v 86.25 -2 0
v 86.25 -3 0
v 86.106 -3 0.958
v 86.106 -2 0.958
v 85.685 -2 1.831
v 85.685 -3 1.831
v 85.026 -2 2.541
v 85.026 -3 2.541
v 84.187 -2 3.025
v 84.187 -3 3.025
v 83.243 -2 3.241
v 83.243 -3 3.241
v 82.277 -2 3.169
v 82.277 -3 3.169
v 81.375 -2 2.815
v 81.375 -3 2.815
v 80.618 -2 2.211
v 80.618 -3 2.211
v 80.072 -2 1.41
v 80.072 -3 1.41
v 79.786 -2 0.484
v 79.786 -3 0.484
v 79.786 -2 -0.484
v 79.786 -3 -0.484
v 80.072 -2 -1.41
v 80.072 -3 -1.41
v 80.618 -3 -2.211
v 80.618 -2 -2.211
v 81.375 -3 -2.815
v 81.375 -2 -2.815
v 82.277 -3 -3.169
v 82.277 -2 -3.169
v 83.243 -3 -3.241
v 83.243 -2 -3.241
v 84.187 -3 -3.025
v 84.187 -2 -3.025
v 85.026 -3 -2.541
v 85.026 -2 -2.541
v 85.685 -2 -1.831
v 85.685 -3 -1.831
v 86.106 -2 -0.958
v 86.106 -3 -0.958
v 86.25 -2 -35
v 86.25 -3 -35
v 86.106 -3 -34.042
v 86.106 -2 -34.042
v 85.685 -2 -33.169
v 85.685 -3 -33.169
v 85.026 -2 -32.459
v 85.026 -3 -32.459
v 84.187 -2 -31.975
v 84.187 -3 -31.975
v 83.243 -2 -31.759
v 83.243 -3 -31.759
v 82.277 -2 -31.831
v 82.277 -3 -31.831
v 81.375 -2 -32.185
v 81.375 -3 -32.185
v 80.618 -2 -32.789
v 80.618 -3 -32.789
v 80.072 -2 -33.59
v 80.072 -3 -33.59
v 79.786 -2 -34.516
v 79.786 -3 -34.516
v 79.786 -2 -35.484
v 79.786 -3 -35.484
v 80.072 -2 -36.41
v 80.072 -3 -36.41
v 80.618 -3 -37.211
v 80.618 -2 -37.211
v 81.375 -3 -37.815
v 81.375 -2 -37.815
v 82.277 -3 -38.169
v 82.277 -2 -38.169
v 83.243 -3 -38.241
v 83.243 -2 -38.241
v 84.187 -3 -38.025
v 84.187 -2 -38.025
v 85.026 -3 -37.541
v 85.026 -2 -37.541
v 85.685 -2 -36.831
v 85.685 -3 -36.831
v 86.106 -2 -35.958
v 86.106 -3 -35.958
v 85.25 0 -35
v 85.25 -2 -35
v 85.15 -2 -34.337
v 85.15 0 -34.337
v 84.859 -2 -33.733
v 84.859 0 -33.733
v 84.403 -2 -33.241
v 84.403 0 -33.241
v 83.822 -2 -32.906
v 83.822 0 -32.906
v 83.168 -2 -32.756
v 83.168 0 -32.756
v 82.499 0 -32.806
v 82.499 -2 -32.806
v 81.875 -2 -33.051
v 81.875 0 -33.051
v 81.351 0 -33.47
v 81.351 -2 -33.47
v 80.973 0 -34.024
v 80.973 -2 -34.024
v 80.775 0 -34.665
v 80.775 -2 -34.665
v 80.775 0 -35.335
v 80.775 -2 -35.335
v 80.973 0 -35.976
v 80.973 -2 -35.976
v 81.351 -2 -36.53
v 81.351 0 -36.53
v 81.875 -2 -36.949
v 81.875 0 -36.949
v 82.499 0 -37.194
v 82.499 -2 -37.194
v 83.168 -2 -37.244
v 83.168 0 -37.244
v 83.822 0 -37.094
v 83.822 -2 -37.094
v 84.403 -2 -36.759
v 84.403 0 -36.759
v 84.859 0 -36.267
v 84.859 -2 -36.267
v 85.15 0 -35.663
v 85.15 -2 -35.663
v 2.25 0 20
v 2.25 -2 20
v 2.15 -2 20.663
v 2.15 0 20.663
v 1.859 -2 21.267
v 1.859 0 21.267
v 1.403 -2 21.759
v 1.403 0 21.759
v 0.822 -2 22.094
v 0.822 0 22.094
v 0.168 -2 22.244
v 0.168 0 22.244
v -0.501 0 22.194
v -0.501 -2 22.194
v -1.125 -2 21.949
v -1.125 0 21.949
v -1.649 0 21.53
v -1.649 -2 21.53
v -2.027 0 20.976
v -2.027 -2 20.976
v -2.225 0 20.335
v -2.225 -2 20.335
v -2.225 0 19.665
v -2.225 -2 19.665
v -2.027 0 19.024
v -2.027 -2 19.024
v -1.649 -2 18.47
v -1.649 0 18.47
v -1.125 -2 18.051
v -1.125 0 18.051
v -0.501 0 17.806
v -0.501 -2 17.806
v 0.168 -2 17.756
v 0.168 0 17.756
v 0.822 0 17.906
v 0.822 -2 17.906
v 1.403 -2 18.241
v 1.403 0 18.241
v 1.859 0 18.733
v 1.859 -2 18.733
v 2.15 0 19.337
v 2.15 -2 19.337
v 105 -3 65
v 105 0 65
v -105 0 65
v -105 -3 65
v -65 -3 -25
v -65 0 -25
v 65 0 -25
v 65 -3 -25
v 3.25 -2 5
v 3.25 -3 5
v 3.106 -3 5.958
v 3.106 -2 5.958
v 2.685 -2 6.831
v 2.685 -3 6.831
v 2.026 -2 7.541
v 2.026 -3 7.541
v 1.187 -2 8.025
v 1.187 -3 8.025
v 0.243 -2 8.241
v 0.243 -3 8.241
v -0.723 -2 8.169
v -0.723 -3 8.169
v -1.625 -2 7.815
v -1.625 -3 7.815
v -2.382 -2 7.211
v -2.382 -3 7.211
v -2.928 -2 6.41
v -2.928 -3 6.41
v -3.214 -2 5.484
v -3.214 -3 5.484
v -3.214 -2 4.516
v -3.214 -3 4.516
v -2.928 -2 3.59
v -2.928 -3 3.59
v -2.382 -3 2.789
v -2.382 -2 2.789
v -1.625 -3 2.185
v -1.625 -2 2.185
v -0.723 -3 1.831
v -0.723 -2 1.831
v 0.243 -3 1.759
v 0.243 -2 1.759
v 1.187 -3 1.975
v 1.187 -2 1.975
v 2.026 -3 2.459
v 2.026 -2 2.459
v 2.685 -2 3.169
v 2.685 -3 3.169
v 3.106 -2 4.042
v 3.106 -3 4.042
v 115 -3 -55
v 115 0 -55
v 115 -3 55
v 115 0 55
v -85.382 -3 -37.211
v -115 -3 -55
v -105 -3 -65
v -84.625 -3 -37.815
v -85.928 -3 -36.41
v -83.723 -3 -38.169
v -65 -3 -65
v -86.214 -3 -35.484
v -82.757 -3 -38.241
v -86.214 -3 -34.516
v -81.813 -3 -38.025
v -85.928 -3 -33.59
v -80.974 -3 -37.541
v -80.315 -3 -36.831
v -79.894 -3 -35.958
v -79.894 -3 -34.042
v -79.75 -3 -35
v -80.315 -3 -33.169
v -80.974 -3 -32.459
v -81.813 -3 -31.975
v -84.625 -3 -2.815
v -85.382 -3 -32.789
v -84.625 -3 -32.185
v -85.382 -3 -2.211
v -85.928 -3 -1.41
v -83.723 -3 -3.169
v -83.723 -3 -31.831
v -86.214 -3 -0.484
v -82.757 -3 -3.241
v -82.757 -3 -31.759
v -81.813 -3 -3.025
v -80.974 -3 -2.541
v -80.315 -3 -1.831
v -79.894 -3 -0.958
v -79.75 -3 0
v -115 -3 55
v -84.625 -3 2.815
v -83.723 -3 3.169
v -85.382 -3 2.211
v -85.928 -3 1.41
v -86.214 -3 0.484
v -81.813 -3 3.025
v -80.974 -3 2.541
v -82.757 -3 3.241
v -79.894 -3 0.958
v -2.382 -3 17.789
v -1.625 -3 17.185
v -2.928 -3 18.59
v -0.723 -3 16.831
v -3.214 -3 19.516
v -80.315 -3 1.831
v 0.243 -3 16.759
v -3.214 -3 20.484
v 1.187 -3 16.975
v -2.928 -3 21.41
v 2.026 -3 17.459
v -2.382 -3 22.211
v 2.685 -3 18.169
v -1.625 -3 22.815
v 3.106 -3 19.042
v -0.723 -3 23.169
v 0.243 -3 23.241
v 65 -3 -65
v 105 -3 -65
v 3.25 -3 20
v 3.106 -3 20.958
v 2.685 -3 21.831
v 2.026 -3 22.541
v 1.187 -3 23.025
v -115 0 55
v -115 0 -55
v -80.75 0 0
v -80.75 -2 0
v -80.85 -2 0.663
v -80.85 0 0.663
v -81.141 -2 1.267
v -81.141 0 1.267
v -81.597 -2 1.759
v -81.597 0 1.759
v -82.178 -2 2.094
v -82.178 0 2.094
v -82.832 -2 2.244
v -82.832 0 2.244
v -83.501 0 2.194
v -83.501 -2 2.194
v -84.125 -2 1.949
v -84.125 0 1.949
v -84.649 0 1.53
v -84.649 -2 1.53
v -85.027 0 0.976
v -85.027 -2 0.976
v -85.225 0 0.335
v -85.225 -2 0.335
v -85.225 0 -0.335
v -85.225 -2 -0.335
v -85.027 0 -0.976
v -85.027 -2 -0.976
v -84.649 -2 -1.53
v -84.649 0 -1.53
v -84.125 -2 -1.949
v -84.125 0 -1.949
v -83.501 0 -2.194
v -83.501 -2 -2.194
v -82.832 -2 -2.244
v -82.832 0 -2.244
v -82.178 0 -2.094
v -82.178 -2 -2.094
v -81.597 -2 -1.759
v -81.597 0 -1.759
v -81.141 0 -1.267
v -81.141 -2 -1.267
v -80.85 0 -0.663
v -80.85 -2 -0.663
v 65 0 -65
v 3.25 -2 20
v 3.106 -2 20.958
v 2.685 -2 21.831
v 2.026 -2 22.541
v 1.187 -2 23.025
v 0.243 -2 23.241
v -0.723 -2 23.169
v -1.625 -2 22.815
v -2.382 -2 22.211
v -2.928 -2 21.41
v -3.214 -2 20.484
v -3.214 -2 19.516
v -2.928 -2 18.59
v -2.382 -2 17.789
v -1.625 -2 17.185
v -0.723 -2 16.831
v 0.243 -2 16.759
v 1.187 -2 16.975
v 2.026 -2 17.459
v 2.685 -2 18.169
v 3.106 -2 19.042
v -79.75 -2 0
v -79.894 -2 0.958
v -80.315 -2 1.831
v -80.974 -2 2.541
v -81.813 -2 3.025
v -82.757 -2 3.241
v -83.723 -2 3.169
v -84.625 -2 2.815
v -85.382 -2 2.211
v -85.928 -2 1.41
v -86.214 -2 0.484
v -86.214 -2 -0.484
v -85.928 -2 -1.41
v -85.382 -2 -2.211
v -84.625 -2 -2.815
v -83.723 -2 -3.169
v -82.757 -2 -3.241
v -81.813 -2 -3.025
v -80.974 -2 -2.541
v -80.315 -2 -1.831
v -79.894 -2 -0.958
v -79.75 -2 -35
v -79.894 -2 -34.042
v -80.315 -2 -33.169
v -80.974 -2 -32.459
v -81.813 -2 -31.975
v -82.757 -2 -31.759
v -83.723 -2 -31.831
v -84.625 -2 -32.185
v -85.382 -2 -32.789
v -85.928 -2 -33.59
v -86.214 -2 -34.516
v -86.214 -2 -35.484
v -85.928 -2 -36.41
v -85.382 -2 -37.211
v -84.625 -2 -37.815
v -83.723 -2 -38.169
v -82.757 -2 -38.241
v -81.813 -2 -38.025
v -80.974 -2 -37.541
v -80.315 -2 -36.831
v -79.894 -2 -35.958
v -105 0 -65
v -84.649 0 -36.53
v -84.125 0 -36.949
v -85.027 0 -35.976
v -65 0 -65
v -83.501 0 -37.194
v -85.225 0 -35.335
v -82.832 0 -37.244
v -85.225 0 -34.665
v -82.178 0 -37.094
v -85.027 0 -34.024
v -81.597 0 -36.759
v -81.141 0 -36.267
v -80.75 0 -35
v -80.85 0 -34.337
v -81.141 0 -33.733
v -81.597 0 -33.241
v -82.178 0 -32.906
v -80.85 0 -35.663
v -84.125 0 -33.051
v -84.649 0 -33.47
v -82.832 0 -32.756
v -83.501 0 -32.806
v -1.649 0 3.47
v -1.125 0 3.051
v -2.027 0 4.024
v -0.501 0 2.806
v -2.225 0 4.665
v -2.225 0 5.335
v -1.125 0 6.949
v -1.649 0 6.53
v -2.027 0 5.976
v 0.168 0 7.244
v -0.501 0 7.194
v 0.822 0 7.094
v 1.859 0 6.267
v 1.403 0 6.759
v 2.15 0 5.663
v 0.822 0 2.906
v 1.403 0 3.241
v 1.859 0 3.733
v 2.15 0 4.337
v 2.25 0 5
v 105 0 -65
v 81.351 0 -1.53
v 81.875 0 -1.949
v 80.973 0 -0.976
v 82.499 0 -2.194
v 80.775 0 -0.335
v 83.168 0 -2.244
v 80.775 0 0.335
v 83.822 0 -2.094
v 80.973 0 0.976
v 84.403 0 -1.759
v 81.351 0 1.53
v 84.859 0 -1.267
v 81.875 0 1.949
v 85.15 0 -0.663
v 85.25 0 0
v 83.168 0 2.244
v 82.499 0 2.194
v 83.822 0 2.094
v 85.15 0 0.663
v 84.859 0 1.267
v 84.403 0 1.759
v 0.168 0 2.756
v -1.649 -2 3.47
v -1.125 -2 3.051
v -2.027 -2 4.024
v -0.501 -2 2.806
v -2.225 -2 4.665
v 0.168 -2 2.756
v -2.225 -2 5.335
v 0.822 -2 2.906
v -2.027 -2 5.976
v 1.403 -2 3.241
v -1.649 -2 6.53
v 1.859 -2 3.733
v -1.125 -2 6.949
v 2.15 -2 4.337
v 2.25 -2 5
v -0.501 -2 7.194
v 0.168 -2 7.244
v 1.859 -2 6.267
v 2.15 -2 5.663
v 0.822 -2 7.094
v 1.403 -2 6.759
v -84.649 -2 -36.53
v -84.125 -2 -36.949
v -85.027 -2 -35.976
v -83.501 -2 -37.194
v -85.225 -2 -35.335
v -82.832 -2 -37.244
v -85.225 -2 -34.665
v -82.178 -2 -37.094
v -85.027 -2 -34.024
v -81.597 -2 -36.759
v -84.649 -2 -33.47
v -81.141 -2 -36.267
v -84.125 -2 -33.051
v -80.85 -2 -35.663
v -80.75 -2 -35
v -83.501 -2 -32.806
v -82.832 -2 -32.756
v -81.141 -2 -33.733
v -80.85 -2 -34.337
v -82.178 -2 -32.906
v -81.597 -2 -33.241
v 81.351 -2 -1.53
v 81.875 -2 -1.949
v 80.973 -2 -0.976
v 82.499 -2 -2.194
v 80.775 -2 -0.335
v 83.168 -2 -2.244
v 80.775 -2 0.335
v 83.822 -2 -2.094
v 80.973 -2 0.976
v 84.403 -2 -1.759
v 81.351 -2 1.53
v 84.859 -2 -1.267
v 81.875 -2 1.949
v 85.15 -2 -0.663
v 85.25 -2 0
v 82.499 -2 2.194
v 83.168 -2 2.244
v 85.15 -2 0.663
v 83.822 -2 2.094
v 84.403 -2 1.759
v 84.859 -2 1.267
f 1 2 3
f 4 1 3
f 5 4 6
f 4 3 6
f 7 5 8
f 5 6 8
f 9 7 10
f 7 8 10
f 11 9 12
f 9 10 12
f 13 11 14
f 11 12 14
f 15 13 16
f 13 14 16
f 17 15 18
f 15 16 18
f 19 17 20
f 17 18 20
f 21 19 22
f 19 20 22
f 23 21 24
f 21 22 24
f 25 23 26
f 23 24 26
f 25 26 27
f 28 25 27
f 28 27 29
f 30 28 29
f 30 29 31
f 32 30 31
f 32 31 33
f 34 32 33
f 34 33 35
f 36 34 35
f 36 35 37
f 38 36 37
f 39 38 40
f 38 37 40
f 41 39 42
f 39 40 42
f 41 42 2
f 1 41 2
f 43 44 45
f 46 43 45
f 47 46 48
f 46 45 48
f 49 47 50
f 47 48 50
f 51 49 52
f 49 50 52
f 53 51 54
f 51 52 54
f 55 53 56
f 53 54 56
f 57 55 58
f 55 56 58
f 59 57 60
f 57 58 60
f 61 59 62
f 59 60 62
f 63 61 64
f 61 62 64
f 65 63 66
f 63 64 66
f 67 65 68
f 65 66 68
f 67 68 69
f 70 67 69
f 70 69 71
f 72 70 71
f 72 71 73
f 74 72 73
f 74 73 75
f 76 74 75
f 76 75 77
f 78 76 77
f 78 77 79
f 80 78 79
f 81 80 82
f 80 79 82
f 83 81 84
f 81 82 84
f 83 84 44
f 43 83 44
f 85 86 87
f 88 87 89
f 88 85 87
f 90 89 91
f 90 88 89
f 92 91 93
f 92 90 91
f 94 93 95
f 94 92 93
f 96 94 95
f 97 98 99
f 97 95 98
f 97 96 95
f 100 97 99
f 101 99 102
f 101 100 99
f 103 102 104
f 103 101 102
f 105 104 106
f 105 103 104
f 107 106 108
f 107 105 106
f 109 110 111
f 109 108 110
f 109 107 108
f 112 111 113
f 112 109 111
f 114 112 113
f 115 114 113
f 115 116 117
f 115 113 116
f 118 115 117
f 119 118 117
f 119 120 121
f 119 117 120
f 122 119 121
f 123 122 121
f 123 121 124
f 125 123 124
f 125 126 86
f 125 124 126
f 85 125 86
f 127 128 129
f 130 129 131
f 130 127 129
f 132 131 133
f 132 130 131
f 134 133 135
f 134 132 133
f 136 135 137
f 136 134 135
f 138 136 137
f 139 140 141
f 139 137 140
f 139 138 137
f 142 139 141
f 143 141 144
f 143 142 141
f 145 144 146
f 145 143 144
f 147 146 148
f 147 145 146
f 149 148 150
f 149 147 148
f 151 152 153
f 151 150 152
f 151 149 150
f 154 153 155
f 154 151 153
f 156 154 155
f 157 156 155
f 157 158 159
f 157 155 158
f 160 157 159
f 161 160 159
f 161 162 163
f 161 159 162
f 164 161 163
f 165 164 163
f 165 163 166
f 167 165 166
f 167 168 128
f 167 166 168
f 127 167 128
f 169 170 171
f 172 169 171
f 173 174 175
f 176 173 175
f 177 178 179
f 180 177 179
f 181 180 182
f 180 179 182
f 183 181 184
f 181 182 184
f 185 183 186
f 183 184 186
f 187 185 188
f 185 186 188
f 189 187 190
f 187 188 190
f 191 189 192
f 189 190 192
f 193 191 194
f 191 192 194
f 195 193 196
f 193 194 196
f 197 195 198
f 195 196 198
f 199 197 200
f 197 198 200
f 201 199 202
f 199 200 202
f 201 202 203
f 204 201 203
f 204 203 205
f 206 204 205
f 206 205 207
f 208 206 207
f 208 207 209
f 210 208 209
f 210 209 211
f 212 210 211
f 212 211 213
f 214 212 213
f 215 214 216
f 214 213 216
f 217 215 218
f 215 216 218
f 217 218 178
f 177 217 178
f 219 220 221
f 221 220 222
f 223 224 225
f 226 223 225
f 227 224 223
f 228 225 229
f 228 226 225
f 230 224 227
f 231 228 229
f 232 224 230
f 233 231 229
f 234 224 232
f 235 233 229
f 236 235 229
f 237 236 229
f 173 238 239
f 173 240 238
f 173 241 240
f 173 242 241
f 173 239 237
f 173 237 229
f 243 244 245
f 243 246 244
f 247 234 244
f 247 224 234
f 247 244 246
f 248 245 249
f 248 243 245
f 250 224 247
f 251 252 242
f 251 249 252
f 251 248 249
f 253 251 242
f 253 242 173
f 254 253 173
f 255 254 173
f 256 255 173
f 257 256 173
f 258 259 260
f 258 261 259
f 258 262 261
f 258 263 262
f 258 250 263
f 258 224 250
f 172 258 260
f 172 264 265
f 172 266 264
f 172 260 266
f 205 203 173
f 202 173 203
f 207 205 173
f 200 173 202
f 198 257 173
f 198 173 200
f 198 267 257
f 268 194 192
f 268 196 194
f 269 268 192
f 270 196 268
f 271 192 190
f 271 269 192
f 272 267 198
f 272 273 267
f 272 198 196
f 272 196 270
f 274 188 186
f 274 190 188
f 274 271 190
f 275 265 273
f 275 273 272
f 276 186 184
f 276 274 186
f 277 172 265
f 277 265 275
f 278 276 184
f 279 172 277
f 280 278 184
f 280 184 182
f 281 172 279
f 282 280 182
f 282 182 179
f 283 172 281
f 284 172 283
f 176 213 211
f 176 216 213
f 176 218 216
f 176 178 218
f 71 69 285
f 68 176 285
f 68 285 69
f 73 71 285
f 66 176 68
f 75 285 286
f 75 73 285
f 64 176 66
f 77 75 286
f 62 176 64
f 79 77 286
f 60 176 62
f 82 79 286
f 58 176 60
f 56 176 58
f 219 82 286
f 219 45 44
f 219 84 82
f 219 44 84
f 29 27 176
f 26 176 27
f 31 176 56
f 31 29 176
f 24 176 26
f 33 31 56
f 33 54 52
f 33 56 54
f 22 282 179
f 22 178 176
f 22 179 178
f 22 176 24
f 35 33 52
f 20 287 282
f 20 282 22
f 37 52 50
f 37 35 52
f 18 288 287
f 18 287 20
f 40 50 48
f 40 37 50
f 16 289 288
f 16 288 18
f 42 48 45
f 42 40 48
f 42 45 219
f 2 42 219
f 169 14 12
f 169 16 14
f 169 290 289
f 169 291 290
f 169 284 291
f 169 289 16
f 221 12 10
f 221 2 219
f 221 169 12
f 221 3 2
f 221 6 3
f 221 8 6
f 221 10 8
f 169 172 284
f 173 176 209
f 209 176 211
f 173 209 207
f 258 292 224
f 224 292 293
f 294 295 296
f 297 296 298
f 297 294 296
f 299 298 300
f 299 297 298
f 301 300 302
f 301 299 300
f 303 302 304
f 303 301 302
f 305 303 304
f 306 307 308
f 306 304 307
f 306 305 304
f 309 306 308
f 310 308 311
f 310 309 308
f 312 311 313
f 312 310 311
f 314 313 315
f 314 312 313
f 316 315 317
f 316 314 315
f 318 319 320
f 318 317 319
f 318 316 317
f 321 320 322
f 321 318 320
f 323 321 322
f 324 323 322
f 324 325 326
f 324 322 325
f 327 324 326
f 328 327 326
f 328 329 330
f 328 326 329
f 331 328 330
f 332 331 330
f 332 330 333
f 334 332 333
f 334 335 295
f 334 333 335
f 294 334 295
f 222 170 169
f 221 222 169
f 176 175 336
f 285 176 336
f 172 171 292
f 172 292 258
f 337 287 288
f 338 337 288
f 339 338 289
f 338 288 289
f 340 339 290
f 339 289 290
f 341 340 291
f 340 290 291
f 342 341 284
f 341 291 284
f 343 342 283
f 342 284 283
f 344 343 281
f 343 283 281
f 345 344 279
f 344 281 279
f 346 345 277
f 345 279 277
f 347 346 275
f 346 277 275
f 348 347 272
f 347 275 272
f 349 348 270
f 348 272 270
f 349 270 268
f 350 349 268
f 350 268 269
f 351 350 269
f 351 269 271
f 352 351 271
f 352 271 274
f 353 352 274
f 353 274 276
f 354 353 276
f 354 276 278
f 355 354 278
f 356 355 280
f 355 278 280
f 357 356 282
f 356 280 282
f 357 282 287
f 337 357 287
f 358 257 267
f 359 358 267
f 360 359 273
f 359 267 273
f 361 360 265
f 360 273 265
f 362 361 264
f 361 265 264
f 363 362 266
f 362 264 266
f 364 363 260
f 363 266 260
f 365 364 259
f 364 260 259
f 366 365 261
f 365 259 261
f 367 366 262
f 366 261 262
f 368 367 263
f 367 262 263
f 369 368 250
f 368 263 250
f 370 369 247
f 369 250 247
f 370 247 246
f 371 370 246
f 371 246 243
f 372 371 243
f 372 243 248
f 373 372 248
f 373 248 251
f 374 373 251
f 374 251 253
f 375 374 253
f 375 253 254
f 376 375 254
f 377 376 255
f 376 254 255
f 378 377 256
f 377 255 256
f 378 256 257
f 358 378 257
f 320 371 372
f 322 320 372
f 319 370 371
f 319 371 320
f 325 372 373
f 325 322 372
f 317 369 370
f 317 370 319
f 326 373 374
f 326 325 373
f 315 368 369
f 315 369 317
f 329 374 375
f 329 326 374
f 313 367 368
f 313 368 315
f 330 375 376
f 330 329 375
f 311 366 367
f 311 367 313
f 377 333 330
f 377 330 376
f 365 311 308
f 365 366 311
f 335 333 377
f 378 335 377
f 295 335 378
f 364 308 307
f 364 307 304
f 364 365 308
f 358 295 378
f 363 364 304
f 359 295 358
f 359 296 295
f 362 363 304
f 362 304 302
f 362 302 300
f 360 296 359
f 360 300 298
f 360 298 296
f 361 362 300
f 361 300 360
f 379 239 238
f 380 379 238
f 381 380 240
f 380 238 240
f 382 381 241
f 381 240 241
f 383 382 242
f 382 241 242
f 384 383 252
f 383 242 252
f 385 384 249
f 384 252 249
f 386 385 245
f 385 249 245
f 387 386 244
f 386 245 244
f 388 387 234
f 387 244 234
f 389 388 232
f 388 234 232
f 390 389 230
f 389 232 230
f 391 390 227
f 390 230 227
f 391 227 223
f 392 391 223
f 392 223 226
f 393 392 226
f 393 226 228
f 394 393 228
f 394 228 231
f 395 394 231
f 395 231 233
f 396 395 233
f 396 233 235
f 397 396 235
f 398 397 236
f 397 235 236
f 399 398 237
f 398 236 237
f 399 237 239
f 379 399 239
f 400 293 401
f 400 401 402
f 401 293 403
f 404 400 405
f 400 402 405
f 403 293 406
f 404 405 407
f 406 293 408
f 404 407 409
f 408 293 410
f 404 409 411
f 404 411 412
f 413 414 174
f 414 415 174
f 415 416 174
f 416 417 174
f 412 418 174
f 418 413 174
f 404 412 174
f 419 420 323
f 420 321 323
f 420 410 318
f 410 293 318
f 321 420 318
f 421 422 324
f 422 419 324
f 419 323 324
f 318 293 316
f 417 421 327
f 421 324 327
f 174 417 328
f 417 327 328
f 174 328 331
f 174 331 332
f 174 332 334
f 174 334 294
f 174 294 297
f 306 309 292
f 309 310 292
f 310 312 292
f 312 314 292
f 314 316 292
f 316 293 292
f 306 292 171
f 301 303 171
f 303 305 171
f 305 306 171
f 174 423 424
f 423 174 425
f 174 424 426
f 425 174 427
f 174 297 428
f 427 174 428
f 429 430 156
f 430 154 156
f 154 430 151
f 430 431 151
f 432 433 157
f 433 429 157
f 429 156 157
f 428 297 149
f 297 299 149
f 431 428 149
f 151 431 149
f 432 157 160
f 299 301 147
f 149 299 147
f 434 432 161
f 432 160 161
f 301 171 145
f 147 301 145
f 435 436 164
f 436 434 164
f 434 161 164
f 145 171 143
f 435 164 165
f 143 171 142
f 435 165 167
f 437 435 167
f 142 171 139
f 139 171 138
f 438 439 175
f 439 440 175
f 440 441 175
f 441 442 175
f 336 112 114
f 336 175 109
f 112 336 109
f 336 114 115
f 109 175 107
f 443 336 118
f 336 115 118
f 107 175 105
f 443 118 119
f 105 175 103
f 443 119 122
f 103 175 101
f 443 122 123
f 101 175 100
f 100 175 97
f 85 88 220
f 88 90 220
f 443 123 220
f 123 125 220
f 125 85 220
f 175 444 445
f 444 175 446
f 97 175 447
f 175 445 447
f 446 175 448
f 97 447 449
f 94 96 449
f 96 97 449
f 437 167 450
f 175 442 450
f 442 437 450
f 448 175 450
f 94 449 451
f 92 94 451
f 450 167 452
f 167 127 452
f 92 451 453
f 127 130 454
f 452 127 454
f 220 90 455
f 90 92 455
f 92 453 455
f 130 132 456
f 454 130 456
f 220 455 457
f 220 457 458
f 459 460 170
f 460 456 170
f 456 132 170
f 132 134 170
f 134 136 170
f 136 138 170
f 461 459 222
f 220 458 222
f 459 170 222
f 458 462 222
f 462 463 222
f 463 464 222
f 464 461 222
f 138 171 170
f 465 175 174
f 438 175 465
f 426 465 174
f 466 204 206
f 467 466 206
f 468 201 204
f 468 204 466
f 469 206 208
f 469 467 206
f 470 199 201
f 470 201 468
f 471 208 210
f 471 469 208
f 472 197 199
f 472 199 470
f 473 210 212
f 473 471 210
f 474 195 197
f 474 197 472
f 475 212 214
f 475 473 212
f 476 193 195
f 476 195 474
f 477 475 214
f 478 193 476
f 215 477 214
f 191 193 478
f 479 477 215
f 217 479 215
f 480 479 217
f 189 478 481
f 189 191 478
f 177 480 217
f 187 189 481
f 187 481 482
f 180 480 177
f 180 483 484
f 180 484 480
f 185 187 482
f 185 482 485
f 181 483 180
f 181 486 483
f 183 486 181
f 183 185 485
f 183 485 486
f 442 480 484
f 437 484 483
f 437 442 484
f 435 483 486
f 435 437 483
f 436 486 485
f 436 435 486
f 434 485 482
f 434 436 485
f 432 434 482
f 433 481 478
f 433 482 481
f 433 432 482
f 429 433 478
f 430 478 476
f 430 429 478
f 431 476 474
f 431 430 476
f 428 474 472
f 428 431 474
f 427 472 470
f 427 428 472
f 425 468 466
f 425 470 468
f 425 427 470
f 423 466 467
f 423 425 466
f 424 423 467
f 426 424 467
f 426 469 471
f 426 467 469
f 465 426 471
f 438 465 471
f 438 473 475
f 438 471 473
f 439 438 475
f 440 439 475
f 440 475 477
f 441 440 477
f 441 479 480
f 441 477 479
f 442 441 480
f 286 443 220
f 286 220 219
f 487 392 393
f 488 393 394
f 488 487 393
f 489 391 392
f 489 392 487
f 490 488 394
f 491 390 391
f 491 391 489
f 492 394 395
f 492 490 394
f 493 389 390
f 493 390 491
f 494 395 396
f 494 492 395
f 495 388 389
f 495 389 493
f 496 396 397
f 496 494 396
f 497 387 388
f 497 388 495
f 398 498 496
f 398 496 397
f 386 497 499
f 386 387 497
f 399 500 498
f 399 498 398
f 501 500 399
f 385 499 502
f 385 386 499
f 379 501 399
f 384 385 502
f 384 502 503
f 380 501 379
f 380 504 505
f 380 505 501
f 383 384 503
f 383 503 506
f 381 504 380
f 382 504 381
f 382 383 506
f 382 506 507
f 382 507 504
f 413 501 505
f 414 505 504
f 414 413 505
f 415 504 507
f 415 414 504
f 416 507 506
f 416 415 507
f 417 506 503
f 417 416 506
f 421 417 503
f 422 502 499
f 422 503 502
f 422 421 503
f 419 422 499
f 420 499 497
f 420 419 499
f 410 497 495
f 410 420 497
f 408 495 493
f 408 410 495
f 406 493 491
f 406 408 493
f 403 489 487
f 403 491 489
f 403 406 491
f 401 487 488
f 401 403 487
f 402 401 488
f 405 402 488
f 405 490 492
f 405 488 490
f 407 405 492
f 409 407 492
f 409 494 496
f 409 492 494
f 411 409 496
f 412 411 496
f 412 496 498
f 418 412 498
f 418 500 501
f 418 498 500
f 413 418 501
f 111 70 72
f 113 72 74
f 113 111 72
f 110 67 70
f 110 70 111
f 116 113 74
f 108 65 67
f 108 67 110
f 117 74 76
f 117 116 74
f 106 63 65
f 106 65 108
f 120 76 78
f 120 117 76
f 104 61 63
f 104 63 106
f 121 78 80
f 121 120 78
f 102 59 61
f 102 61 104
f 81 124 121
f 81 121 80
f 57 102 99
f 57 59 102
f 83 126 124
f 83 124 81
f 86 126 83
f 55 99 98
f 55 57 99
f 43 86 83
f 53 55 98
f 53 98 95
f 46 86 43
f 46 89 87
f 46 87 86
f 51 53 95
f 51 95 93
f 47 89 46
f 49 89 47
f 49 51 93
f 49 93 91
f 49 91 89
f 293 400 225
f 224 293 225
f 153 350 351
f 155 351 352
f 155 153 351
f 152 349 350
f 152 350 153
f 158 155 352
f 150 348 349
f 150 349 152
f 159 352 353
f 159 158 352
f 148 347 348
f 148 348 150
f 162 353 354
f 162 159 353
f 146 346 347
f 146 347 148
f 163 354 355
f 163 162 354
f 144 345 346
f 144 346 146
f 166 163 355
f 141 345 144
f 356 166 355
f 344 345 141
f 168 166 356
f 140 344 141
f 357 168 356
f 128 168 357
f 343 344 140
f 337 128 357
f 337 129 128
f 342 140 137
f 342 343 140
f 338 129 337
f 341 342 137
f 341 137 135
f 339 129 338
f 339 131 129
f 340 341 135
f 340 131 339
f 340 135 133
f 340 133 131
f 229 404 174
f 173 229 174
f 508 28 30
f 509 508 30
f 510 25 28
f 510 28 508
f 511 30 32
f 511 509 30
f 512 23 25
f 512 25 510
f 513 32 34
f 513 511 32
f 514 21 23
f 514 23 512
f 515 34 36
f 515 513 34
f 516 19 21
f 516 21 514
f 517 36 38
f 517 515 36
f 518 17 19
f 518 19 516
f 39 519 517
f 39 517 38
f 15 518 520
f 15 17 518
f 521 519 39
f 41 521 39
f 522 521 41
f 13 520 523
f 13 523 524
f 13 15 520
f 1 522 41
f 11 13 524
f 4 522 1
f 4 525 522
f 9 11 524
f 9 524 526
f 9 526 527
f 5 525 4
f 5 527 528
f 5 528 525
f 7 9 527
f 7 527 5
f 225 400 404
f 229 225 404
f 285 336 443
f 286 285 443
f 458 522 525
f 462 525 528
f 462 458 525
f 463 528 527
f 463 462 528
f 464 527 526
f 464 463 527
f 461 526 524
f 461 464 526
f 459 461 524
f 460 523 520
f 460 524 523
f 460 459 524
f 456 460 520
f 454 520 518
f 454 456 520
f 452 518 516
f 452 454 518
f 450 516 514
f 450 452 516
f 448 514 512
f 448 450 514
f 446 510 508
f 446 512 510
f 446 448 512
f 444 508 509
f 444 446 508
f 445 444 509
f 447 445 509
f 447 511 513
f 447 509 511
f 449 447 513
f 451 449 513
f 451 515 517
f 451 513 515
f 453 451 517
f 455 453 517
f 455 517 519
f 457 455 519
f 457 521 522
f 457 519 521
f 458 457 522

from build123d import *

# Parameters (mm, degrees)
F0_R     = 2.25
F1_DEPTH = 3
F2_SIZE  = 10
F3_R     = 3.25
F4_DEPTH = 1


with BuildPart() as f1:
    # F0 (on Front) → F1 (new body)
    with BuildSketch(Plane.XZ):
        Polygon((115, 65), (-115, 65), (-115, -65), (-65, -65), (-65, -25), (0, -25), (65, -25), (65, -65), (115, -65), align=None)
        with Locations((-83, -35)):
            Circle(F0_R, mode=Mode.SUBTRACT)
        with Locations((83, -35)):
            Circle(F0_R, mode=Mode.SUBTRACT)
        with Locations((-83, 0)):
            Circle(F0_R, mode=Mode.SUBTRACT)
        with Locations((0, 5)):
            Circle(F0_R, mode=Mode.SUBTRACT)
        with Locations((0, 20)):
            Circle(F0_R, mode=Mode.SUBTRACT)
        with Locations((83, 0)):
            Circle(F0_R, mode=Mode.SUBTRACT)
    extrude(amount=F1_DEPTH)

    # F2
    f2_edges = [f1.edges().sort_by_distance(p)[0] for p in [
        (-115, -1.5, 65),
        (115, -1.5, 65),
        (115, -1.5, -65),
        (-115, -1.5, -65),
    ]]
    chamfer(f2_edges, length=F2_SIZE)

    # F3 (on face) → F4 (cut)
    with BuildSketch(Plane.XZ.offset(3)):
        with Locations((-83, 0)):
            Circle(F3_R)
        with Locations((-83, -35)):
            Circle(F3_R)
        with Locations((0, 20)):
            Circle(F3_R)
        with Locations((0, 5)):
            Circle(F3_R)
        with Locations((83, 0)):
            Circle(F3_R)
        with Locations((83, -35)):
            Circle(F3_R)
    extrude(amount=-F4_DEPTH, mode=Mode.SUBTRACT)


solid = f1.part
